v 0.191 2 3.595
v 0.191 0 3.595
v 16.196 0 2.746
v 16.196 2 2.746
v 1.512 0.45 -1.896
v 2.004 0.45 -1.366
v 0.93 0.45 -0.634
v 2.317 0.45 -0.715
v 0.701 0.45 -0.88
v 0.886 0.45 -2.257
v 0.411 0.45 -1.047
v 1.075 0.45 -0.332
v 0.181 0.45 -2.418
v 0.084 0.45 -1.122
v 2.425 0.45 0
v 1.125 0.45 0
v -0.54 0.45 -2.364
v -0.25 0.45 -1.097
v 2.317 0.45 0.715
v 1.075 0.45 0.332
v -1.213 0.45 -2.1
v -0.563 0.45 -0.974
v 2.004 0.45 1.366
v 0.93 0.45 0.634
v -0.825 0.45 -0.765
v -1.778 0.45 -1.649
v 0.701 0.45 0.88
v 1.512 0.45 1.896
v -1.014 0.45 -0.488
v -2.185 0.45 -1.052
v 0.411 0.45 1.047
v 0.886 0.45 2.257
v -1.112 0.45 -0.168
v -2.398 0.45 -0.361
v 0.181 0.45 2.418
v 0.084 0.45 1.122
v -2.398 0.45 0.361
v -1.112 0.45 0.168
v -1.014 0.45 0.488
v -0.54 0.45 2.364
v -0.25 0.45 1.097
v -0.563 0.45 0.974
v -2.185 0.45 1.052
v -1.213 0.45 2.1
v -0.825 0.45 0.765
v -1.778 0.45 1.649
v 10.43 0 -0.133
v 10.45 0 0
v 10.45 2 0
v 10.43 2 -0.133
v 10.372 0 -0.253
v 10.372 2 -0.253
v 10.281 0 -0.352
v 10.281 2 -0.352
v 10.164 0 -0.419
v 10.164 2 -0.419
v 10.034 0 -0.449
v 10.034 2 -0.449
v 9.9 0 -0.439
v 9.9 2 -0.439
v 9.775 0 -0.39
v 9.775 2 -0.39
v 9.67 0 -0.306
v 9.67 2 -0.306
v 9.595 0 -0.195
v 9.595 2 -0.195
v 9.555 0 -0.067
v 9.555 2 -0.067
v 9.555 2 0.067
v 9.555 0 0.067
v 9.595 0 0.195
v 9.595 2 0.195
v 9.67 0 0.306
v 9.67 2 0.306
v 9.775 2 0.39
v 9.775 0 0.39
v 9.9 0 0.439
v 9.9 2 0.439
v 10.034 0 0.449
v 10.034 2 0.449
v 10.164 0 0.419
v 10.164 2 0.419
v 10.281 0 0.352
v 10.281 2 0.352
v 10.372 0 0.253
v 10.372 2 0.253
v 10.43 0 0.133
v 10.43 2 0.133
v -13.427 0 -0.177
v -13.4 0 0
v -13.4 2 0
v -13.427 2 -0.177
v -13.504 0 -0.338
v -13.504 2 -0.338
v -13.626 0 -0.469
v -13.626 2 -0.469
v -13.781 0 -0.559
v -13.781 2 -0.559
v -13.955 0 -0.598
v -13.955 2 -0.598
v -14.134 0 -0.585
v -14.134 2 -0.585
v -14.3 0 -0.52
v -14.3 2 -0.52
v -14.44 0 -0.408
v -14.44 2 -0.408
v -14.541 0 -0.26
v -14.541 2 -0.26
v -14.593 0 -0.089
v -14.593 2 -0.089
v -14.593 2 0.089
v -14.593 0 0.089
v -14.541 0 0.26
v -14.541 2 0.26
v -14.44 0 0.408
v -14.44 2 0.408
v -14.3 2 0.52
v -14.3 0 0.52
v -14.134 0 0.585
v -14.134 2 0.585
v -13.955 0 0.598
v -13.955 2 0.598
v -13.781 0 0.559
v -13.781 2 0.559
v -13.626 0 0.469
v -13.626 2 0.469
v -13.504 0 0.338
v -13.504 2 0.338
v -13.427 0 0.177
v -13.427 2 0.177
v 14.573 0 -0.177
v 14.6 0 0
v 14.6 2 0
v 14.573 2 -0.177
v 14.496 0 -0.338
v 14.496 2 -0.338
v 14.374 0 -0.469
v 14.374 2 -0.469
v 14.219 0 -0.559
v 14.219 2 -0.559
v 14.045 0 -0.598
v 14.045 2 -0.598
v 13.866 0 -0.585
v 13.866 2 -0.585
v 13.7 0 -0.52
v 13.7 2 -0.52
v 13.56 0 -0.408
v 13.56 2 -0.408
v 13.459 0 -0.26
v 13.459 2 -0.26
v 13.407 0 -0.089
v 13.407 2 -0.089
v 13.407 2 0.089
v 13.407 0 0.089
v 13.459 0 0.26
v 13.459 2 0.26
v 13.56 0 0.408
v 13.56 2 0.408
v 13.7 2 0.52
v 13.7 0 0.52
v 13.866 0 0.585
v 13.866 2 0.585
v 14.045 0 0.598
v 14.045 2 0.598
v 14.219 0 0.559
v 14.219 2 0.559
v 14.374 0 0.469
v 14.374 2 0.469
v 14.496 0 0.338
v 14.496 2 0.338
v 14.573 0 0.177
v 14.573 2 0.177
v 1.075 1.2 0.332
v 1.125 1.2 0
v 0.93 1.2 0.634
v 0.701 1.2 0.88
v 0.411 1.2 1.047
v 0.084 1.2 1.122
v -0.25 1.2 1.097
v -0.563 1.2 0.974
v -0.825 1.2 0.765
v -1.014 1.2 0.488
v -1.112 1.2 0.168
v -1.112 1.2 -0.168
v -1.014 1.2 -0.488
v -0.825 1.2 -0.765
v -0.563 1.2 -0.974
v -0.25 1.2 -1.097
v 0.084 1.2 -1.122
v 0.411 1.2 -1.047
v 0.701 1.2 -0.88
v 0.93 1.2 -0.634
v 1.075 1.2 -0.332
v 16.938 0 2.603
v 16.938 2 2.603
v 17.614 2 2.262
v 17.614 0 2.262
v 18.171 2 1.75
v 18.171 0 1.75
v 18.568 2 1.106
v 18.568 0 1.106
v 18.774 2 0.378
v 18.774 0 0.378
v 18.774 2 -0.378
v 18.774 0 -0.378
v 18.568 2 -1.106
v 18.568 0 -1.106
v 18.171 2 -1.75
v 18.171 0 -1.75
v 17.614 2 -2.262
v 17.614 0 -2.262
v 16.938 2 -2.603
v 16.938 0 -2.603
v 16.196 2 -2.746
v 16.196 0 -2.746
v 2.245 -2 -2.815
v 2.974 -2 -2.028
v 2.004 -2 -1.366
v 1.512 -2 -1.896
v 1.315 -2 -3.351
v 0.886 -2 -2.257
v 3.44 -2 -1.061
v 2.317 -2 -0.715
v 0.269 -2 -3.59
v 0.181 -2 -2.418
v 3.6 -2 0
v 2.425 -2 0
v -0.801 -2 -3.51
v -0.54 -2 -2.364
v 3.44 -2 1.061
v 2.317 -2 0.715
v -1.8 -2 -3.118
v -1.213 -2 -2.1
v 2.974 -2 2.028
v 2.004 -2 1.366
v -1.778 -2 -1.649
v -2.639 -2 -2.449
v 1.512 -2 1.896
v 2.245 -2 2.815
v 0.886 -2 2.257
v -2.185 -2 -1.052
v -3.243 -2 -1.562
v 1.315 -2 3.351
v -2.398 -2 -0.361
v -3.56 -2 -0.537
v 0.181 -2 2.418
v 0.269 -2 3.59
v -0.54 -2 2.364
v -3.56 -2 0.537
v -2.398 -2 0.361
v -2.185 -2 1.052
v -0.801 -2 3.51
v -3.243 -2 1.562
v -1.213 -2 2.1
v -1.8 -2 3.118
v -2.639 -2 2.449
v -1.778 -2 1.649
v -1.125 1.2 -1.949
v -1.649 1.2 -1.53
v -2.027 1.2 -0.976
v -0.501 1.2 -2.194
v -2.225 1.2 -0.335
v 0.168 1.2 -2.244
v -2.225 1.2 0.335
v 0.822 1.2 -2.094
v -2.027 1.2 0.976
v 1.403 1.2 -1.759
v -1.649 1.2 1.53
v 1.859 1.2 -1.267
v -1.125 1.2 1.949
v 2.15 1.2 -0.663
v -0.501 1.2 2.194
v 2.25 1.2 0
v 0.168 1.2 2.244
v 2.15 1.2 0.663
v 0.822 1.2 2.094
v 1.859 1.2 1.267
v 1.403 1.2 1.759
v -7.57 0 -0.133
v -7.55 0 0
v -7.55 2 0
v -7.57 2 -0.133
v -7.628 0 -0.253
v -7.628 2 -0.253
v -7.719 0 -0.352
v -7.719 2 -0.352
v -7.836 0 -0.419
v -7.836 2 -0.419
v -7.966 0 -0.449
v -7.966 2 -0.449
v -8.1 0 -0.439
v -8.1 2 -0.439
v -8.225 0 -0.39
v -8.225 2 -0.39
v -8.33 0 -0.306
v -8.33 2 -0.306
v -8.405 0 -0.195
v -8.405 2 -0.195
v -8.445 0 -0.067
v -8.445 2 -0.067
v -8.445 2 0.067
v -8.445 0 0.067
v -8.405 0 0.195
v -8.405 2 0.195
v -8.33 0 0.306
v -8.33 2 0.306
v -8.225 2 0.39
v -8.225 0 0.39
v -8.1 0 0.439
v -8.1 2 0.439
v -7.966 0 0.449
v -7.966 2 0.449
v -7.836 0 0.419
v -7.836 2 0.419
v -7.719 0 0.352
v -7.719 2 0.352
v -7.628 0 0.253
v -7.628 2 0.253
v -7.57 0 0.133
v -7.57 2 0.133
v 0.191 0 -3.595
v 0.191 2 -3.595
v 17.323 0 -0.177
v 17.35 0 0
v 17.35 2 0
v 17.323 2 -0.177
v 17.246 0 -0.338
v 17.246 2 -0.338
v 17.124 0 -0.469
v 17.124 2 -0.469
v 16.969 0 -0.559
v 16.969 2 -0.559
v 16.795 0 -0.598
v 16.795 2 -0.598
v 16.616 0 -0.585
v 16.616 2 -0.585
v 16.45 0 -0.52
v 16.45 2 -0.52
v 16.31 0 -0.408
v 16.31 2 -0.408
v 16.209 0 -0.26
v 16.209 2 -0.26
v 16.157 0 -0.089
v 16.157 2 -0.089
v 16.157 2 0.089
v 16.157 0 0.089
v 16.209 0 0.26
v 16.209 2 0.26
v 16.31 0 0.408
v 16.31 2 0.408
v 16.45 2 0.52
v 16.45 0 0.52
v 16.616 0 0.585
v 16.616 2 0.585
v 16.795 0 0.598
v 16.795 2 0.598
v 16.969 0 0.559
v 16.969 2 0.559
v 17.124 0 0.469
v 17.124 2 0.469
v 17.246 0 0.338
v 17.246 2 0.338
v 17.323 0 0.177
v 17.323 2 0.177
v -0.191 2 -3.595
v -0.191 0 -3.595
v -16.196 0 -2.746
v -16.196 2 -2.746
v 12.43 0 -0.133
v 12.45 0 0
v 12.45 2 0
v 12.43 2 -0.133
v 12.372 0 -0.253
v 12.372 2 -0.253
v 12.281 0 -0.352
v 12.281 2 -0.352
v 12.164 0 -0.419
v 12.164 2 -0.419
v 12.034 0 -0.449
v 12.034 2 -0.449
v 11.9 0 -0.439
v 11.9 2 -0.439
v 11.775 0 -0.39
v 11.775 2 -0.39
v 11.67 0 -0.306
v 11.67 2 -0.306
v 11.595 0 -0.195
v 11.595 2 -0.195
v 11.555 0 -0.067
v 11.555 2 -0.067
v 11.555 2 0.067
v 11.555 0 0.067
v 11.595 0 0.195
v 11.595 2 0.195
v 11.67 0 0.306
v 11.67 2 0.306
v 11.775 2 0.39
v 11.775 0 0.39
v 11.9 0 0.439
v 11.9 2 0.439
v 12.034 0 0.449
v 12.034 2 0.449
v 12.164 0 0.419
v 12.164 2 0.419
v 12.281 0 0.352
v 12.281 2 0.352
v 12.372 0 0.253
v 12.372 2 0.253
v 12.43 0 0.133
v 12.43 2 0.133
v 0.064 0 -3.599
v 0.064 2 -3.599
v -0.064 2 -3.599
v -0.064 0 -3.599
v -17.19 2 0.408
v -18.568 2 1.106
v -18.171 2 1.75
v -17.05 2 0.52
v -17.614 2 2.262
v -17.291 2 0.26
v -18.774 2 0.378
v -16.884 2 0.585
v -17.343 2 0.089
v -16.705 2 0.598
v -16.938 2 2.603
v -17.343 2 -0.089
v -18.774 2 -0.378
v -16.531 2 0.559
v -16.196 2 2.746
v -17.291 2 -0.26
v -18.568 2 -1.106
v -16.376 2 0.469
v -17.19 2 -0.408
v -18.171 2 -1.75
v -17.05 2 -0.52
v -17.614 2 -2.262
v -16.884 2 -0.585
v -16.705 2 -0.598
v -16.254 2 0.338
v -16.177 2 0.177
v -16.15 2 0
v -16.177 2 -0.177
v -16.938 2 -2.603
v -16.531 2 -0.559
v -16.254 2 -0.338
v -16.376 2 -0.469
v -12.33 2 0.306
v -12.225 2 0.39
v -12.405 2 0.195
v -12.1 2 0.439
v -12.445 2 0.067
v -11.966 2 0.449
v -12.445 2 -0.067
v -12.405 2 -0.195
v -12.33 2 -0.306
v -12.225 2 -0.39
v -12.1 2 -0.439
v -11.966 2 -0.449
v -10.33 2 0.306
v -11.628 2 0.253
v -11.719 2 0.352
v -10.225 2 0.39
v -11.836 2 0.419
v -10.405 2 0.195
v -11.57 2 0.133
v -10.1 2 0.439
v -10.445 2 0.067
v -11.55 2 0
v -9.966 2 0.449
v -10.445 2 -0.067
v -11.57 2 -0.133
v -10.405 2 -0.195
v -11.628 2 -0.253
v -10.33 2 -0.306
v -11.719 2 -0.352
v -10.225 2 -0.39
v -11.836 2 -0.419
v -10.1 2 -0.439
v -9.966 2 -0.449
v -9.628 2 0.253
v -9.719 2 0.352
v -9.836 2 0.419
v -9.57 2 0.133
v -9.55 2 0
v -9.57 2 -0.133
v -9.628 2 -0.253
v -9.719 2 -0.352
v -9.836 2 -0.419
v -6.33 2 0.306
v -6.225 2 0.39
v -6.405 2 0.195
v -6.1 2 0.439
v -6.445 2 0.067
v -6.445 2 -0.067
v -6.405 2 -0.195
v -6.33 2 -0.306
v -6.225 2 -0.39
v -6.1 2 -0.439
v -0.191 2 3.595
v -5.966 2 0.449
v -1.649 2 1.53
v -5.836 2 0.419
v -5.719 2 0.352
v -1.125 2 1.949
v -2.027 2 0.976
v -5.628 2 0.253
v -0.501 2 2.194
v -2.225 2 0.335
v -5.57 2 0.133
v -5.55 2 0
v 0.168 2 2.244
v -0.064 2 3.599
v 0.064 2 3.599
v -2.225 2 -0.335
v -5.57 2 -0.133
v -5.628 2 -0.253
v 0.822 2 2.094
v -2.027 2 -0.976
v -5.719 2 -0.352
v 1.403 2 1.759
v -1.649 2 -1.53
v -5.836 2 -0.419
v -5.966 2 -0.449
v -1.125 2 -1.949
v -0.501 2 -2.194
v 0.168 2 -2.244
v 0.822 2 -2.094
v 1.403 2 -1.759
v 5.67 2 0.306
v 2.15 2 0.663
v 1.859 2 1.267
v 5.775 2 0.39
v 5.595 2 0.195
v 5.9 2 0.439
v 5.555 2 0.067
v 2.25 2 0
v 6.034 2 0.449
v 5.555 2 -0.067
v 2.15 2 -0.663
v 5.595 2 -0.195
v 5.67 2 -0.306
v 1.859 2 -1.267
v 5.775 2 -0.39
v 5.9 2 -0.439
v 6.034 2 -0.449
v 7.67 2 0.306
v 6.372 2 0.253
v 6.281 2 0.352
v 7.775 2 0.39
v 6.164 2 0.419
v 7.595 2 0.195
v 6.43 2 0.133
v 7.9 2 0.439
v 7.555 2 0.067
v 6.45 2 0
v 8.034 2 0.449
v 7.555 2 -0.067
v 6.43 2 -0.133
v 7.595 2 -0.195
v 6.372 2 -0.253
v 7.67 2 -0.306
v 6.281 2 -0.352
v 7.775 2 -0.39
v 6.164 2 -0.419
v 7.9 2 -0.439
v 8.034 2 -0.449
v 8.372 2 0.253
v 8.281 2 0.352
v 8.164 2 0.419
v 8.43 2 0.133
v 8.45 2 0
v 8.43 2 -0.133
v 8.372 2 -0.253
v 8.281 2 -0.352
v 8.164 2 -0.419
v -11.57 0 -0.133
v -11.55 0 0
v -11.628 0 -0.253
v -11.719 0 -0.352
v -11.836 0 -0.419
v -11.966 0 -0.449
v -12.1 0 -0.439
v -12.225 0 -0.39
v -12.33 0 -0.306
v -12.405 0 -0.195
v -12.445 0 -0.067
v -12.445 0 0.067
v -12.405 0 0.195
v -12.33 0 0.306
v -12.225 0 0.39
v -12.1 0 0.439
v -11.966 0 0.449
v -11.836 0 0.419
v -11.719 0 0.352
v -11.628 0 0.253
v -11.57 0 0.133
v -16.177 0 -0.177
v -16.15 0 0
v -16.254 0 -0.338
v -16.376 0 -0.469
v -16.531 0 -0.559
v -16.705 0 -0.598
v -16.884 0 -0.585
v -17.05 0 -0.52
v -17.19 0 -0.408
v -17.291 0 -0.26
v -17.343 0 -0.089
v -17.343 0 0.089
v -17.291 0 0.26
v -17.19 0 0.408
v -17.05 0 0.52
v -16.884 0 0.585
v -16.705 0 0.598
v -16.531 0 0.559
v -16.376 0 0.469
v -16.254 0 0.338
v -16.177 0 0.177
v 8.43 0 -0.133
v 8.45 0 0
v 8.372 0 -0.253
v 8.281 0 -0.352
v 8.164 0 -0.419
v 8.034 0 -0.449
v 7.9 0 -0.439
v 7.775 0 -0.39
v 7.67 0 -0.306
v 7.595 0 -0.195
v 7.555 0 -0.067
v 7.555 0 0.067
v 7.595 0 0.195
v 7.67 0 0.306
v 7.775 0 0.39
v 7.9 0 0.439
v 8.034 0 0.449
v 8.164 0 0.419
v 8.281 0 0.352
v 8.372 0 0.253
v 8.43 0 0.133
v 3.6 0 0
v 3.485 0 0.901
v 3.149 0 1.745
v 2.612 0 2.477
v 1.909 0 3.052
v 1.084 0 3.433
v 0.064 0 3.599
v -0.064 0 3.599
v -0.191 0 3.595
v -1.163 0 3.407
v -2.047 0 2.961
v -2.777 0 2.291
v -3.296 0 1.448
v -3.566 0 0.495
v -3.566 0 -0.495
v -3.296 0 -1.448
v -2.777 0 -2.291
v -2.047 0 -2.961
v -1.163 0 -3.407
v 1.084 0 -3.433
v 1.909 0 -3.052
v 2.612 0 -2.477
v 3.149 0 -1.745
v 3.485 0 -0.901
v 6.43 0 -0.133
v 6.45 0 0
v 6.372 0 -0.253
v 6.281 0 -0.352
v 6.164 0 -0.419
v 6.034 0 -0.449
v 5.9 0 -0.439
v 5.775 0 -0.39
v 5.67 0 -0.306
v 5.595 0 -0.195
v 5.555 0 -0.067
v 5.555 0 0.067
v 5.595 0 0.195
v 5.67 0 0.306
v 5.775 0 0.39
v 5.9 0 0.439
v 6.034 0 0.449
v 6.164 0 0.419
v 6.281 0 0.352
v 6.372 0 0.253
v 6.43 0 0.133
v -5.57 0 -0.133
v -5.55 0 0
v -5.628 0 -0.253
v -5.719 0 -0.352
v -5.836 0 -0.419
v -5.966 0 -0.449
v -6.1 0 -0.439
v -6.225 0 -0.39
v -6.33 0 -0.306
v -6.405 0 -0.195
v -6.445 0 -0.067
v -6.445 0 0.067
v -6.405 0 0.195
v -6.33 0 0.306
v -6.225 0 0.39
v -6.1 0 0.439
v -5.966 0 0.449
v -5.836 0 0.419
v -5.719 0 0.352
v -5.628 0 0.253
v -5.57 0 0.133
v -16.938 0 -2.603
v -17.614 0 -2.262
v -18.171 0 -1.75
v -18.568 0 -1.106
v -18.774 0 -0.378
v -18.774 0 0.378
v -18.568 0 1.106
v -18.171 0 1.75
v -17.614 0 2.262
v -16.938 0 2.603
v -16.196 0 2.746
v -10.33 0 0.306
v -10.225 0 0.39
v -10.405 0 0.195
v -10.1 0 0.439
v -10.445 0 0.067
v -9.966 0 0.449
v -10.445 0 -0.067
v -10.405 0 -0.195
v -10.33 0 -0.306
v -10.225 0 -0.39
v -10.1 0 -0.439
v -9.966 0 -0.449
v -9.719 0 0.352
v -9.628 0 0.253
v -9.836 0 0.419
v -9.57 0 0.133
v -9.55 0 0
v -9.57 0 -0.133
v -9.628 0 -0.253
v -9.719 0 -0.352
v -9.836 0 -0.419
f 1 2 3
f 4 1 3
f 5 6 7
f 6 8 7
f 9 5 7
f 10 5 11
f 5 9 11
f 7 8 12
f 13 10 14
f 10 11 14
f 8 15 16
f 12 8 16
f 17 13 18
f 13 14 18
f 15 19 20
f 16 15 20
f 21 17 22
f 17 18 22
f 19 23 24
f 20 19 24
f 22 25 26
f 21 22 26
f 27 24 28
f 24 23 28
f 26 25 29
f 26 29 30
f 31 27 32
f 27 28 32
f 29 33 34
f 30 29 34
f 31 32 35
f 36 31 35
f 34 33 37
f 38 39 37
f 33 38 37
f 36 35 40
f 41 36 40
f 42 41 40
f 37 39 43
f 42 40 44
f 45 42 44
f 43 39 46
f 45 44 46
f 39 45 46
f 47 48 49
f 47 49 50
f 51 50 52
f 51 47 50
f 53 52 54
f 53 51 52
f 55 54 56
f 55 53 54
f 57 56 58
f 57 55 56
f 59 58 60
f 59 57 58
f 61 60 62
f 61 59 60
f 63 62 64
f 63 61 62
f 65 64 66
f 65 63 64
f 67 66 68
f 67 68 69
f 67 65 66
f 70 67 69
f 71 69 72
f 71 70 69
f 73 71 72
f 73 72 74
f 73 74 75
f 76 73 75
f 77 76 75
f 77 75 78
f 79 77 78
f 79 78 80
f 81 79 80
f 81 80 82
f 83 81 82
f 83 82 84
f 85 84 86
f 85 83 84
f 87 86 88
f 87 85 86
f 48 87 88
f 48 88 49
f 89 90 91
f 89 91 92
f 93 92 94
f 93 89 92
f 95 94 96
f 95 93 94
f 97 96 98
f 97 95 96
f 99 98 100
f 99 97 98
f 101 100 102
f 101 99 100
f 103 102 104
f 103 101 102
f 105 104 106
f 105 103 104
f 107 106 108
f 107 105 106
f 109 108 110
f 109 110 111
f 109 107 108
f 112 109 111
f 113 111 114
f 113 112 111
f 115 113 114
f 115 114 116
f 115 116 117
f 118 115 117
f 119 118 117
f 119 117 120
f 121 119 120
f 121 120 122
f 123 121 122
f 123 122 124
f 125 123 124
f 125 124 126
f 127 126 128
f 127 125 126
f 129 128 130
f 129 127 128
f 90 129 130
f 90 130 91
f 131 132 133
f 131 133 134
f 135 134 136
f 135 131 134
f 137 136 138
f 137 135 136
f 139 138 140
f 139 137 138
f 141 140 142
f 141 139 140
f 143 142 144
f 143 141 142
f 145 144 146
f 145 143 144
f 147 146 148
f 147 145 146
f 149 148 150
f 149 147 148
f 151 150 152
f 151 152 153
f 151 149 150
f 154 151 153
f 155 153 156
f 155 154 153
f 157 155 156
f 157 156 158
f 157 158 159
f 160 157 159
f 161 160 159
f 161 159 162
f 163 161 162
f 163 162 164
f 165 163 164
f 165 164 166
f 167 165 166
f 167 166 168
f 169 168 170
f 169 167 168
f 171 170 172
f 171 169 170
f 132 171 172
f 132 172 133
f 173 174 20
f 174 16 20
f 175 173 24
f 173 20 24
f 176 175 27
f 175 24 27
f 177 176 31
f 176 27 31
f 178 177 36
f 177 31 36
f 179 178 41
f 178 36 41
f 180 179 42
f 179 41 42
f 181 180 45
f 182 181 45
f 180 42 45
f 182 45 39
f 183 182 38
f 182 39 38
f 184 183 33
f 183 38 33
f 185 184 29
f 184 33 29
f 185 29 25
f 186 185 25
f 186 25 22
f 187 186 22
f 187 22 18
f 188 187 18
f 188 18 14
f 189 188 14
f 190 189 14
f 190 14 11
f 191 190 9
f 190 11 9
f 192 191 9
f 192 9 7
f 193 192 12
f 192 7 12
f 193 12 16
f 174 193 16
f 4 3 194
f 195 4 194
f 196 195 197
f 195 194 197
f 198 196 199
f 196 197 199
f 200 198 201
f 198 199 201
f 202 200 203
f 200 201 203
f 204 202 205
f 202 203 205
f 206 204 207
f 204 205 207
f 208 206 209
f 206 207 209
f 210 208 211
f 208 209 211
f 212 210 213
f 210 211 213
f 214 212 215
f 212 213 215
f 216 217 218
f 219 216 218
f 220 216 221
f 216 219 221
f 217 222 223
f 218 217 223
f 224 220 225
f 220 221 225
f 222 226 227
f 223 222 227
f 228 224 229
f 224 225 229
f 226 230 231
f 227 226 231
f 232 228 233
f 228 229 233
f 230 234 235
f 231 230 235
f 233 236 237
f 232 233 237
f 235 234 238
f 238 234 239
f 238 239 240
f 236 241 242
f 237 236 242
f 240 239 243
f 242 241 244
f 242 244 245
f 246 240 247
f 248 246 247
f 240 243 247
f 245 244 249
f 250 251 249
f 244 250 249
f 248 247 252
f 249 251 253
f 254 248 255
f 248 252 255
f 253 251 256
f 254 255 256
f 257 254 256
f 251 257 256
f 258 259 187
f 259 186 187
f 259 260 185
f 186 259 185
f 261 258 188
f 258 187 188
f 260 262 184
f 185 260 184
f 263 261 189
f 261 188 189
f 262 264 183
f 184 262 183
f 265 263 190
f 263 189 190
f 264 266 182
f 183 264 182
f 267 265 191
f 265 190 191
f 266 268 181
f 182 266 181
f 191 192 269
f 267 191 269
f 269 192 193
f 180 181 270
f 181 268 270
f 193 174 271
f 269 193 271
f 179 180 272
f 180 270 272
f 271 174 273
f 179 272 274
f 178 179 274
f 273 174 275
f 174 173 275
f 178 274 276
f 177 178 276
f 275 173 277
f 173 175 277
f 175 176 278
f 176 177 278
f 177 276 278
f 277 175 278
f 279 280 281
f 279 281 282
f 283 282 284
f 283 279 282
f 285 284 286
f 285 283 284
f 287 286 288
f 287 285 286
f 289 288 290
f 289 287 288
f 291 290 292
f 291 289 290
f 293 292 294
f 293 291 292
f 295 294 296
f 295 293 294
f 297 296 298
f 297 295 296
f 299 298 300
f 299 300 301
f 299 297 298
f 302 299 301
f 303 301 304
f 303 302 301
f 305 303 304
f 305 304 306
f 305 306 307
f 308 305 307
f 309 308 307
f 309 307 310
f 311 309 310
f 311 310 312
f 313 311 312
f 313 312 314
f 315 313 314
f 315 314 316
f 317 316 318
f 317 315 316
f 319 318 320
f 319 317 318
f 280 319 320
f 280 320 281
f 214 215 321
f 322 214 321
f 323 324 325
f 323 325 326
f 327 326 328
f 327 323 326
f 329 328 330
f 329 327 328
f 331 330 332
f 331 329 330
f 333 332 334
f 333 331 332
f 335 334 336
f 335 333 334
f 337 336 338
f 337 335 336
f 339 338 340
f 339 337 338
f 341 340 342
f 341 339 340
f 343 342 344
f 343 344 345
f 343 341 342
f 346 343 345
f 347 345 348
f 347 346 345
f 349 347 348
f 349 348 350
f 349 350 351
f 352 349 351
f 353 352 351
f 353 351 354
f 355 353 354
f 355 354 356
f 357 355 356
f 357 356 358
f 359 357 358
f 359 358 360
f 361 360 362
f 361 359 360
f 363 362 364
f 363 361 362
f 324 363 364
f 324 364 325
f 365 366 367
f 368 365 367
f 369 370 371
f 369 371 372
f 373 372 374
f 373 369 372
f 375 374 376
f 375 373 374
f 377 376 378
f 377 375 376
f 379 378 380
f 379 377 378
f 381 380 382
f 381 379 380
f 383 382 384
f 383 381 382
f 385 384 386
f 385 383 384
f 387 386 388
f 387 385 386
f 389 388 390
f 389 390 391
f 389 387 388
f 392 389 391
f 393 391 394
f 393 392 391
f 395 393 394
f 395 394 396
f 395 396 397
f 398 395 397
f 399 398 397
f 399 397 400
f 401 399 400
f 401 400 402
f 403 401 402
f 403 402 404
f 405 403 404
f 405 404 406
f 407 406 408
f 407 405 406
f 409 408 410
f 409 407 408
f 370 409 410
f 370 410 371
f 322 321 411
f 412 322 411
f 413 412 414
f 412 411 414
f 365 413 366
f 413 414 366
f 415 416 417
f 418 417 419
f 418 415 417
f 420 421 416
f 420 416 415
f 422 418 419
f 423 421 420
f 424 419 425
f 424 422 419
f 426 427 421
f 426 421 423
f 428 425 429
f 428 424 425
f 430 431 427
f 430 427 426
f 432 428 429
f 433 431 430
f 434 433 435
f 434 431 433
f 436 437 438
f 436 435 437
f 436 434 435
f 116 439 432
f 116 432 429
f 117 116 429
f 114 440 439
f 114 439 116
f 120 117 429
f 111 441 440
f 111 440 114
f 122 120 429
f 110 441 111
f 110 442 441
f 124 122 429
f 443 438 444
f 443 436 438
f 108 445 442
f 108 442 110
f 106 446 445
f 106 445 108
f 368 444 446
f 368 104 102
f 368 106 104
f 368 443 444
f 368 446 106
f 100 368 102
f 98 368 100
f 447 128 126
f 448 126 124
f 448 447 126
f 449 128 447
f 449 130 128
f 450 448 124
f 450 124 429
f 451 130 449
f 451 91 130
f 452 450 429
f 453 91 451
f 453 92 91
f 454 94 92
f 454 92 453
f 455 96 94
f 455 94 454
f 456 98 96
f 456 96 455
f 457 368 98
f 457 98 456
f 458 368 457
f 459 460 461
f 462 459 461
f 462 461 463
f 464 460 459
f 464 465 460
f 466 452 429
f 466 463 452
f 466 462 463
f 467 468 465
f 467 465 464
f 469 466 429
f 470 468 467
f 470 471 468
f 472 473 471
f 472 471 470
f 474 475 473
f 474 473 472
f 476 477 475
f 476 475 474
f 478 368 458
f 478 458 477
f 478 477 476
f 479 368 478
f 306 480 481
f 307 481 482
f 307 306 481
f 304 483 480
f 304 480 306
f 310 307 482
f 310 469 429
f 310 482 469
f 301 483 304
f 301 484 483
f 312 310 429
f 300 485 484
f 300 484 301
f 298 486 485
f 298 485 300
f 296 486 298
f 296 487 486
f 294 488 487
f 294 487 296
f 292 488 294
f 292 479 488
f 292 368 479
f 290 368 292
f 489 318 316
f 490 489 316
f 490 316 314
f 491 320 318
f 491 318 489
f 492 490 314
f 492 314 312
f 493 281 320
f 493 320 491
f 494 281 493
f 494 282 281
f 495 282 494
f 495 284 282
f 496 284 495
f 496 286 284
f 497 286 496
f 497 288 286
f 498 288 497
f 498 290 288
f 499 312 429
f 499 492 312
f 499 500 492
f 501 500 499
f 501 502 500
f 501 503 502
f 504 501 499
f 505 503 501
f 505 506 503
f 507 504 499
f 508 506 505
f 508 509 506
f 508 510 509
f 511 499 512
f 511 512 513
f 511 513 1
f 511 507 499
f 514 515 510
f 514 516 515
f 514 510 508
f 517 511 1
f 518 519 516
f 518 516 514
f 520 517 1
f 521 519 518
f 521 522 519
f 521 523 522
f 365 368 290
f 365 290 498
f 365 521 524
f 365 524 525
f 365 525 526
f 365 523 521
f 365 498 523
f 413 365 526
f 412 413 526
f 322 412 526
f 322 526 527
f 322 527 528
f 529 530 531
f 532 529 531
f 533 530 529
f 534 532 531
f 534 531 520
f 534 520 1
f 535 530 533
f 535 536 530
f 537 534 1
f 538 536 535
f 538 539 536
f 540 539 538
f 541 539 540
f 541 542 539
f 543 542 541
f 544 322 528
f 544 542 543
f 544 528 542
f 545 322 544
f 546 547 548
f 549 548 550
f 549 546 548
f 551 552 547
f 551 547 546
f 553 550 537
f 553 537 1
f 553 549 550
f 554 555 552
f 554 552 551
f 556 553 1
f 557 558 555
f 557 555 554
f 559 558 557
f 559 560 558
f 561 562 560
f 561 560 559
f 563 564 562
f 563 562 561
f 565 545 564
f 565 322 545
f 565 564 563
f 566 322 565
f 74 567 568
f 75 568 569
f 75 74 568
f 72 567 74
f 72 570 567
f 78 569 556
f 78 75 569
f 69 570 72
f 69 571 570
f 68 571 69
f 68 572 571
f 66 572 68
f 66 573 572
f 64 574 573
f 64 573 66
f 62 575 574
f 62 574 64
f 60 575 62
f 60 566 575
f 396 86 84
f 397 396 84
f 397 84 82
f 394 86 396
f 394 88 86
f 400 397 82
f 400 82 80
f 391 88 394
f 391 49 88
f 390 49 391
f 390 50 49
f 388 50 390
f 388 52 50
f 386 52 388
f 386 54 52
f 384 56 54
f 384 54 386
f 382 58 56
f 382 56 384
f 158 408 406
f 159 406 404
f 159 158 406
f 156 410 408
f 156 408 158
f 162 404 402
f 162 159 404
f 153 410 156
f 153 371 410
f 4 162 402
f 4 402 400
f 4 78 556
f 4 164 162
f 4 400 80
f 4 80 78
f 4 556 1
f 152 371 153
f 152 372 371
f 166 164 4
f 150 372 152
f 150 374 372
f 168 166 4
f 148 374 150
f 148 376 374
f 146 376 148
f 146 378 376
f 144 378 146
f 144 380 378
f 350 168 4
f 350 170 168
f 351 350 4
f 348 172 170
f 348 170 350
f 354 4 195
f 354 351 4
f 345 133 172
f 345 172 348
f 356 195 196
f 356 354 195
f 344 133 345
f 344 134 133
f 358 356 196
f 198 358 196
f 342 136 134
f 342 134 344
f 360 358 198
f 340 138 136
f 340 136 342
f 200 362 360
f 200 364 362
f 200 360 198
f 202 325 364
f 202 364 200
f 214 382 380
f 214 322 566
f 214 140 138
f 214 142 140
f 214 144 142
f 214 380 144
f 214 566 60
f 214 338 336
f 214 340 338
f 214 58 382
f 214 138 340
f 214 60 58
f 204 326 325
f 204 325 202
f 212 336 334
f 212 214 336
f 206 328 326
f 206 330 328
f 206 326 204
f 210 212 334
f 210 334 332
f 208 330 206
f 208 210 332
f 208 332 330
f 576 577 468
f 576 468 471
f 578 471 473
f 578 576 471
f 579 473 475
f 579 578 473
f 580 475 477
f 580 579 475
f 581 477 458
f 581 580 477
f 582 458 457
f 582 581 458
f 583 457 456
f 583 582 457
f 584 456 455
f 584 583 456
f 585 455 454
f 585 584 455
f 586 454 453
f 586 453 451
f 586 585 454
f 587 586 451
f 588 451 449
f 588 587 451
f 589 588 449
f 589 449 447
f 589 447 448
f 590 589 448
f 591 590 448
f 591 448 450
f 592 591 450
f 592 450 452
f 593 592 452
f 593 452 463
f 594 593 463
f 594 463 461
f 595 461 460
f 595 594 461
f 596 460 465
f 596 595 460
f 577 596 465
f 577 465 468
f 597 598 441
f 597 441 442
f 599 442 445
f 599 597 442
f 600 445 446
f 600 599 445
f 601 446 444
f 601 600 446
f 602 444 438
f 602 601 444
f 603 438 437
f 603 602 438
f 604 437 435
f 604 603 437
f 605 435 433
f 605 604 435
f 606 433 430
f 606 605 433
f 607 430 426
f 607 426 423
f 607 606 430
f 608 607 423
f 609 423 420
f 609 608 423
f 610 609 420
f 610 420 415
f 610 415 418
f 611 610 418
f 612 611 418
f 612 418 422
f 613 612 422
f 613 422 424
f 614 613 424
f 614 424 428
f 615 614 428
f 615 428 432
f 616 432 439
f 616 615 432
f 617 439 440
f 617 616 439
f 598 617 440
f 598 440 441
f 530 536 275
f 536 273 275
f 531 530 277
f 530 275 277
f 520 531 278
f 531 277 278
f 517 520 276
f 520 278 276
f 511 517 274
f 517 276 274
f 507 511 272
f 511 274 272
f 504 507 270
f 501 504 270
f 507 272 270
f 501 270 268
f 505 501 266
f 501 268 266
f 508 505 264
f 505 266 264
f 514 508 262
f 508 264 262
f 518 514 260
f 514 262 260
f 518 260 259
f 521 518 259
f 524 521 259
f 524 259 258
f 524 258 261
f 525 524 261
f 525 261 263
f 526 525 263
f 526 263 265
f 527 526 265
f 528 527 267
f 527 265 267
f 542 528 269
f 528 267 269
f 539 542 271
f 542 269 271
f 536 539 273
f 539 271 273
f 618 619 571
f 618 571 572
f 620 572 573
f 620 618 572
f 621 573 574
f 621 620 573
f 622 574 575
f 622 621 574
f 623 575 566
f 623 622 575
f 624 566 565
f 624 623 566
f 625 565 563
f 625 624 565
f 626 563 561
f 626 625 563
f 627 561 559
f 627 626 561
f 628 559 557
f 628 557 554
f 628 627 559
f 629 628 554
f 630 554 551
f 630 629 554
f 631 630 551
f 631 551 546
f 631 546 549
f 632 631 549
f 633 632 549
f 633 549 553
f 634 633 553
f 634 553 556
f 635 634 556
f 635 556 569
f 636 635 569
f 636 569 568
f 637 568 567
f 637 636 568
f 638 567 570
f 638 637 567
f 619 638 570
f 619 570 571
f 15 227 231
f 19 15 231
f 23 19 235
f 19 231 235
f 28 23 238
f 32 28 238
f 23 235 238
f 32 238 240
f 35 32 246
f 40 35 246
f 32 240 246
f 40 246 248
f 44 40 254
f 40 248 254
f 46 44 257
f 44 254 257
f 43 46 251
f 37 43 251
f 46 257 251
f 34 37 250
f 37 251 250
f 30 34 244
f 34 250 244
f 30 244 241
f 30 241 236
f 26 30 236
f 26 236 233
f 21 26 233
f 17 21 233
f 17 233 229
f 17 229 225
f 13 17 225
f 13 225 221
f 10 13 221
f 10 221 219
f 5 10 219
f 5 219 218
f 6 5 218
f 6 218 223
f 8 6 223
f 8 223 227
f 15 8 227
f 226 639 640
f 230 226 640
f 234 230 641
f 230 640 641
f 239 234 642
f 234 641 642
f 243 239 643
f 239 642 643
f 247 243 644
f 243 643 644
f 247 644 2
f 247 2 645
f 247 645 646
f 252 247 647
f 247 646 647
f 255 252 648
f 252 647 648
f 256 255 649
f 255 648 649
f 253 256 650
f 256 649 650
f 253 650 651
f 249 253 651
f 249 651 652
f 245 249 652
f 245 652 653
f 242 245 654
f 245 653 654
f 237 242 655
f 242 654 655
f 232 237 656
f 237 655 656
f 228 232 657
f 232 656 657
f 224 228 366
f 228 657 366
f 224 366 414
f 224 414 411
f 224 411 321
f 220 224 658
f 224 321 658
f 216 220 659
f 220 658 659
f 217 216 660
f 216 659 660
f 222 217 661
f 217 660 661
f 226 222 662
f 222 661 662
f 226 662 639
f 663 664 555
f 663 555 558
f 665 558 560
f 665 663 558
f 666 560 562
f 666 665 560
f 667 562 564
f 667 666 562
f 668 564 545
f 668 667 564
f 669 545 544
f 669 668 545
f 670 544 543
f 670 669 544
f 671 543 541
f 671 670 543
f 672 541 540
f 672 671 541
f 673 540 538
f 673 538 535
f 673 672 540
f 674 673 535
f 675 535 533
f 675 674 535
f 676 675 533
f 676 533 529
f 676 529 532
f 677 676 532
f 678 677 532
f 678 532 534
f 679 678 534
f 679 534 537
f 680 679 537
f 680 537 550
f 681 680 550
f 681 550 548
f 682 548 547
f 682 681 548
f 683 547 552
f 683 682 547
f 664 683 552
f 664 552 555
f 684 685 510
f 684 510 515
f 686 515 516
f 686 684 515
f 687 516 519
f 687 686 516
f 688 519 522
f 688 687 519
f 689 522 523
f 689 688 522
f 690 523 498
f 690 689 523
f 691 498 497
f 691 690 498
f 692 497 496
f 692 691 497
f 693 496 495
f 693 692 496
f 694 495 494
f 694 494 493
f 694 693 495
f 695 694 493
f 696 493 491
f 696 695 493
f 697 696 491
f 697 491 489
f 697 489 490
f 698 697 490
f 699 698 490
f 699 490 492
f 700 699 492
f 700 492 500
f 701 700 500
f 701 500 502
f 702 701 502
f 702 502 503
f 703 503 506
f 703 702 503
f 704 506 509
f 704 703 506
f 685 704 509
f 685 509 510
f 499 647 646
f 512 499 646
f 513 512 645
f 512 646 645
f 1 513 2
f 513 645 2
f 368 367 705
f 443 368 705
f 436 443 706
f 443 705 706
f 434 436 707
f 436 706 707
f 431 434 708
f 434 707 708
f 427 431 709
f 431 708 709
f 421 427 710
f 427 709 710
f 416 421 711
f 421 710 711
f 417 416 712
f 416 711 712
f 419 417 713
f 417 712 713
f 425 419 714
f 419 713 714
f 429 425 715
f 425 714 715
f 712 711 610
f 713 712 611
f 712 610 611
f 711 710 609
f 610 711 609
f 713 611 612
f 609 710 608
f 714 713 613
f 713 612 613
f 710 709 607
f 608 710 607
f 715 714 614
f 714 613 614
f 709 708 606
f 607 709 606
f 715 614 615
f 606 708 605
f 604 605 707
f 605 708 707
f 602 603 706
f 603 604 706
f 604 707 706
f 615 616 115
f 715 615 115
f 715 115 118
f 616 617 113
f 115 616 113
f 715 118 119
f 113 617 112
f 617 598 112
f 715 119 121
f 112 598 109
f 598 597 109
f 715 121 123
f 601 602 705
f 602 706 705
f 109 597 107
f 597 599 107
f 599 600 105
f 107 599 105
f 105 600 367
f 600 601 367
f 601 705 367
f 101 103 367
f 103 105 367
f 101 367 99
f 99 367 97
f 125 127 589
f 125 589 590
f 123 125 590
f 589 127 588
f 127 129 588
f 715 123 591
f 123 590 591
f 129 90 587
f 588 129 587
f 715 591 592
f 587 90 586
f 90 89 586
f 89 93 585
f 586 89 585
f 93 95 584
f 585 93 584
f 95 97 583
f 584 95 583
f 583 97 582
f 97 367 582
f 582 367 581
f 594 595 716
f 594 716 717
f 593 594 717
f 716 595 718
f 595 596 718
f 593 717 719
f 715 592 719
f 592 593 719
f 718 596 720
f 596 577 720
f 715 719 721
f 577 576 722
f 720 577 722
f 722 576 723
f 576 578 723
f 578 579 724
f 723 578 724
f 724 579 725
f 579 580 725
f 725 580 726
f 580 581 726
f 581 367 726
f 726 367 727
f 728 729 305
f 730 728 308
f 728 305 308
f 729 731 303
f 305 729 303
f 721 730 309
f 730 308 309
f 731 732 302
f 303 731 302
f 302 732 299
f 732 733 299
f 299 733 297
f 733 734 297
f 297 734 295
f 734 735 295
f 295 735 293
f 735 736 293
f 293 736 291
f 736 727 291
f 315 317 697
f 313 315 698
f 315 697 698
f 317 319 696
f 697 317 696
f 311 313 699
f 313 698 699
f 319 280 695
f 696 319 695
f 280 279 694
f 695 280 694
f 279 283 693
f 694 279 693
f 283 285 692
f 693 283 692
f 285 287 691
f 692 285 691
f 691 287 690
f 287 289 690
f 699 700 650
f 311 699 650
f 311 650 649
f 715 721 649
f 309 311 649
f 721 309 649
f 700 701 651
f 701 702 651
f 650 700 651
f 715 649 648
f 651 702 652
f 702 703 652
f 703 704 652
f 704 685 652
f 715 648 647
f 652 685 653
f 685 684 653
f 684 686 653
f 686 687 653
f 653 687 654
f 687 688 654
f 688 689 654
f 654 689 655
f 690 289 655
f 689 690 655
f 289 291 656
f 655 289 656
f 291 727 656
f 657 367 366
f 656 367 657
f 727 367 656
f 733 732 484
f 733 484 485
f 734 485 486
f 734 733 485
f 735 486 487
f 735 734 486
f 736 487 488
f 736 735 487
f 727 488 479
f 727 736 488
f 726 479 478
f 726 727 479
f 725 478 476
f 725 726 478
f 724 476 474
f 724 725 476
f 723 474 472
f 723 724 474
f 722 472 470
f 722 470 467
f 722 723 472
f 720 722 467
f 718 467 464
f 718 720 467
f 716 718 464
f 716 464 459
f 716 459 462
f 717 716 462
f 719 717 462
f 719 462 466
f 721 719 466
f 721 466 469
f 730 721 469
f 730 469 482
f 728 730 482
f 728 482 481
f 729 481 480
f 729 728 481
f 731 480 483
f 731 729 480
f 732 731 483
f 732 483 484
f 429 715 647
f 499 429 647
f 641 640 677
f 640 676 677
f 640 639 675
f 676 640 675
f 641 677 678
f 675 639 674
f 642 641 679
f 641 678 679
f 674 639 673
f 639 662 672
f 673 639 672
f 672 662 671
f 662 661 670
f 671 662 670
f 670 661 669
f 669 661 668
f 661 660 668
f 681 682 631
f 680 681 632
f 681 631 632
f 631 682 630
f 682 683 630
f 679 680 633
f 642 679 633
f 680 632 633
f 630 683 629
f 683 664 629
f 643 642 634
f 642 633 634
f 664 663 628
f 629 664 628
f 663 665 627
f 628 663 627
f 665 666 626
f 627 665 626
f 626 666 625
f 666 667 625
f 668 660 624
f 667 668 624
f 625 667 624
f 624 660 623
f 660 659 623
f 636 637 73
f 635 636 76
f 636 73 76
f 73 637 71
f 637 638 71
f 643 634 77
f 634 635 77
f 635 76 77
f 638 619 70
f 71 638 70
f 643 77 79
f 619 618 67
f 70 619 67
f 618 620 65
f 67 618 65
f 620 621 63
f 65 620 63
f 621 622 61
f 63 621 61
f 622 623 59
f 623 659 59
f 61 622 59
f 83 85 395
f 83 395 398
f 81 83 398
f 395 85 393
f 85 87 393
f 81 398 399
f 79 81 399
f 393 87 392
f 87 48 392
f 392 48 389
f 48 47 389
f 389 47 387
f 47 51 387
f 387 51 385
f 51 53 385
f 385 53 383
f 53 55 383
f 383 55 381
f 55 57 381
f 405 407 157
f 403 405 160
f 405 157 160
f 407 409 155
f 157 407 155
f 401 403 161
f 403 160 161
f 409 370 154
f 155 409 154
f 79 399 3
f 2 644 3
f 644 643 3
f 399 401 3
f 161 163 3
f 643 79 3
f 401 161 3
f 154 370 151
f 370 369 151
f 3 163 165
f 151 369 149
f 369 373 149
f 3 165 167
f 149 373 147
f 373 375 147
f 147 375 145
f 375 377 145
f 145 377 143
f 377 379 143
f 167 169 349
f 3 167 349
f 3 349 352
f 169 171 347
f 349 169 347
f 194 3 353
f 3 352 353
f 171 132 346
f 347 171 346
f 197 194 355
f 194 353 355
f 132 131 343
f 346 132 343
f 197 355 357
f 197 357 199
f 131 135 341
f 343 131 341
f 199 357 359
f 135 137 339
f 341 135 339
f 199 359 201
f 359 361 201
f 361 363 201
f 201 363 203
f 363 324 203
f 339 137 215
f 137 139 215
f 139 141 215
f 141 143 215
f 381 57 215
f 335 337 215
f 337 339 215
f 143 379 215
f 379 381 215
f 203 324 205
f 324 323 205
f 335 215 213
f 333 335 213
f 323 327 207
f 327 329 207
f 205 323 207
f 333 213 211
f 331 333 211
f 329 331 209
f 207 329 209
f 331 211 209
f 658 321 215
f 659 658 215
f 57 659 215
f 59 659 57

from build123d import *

# Parameters (mm, degrees)
SKETCH3_R           = 0.6
SKETCH3_R_2         = 0.45
SKETCH3_R_3         = 2.425
BOSS_EXTRUDE1_DEPTH = 2


with BuildPart() as part:
    # Sketch2 → Revolve1 (revolve)
    with BuildSketch(Plane.XY):
        Polygon((2.25, 2), (2.25, 1.2), (1.125, 1.2), (1.125, 0.45), (2.425, 0.45), (2.425, -2), (3.6, -2), (3.6, 2), align=None)
    revolve(axis=Axis((0, 55, 0), (0, -1, 0)))

    # Sketch3 → Boss-Extrude1 (add)
    with BuildSketch(Plane(origin=(0, 0, 0), x_dir=(1, 0, 0), z_dir=(0, 1, 0))):
        with BuildLine():
            Line((0.190654206, -3.594947979), (16.195638629, -2.746140818))
            ThreePointArc((16.195638629, -2.746140818), (18.8, 0), (16.195638629, 2.746140818))
            Line((16.195638629, 2.746140818), (0.190654206, 3.594947979))
            ThreePointArc((0.190654206, 3.594947979), (0, 3.6), (-0.190654206, 3.594947979))
            Line((-0.190654206, 3.594947979), (-16.195638629, 2.746140818))
            ThreePointArc((-16.195638629, 2.746140818), (-18.8, 0), (-16.195638629, -2.746140818))
            Line((-16.195638629, -2.746140818), (-0.190654206, -3.594947979))
            ThreePointArc((-0.190654206, -3.594947979), (0, -3.6), (0.190654206, -3.594947979))
        make_face()
        with Locations((-16.75, 0)):
            Circle(SKETCH3_R, mode=Mode.SUBTRACT)
        with Locations((16.75, 0)):
            Circle(SKETCH3_R, mode=Mode.SUBTRACT)
        with Locations((-14, 0)):
            Circle(SKETCH3_R, mode=Mode.SUBTRACT)
        with Locations((14, 0)):
            Circle(SKETCH3_R, mode=Mode.SUBTRACT)
        with Locations((-12, 0)):
            Circle(SKETCH3_R_2, mode=Mode.SUBTRACT)
        with Locations((-10, 0)):
            Circle(SKETCH3_R_2, mode=Mode.SUBTRACT)
        with Locations((-8, 0)):
            Circle(SKETCH3_R_2, mode=Mode.SUBTRACT)
        with Locations((-6, 0)):
            Circle(SKETCH3_R_2, mode=Mode.SUBTRACT)
        with Locations((6, 0)):
            Circle(SKETCH3_R_2, mode=Mode.SUBTRACT)
        with Locations((8, 0)):
            Circle(SKETCH3_R_2, mode=Mode.SUBTRACT)
        with Locations((10, 0)):
            Circle(SKETCH3_R_2, mode=Mode.SUBTRACT)
        with Locations((12, 0)):
            Circle(SKETCH3_R_2, mode=Mode.SUBTRACT)
        Circle(SKETCH3_R_3, mode=Mode.SUBTRACT)
    extrude(amount=BOSS_EXTRUDE1_DEPTH)


solid = part.part
